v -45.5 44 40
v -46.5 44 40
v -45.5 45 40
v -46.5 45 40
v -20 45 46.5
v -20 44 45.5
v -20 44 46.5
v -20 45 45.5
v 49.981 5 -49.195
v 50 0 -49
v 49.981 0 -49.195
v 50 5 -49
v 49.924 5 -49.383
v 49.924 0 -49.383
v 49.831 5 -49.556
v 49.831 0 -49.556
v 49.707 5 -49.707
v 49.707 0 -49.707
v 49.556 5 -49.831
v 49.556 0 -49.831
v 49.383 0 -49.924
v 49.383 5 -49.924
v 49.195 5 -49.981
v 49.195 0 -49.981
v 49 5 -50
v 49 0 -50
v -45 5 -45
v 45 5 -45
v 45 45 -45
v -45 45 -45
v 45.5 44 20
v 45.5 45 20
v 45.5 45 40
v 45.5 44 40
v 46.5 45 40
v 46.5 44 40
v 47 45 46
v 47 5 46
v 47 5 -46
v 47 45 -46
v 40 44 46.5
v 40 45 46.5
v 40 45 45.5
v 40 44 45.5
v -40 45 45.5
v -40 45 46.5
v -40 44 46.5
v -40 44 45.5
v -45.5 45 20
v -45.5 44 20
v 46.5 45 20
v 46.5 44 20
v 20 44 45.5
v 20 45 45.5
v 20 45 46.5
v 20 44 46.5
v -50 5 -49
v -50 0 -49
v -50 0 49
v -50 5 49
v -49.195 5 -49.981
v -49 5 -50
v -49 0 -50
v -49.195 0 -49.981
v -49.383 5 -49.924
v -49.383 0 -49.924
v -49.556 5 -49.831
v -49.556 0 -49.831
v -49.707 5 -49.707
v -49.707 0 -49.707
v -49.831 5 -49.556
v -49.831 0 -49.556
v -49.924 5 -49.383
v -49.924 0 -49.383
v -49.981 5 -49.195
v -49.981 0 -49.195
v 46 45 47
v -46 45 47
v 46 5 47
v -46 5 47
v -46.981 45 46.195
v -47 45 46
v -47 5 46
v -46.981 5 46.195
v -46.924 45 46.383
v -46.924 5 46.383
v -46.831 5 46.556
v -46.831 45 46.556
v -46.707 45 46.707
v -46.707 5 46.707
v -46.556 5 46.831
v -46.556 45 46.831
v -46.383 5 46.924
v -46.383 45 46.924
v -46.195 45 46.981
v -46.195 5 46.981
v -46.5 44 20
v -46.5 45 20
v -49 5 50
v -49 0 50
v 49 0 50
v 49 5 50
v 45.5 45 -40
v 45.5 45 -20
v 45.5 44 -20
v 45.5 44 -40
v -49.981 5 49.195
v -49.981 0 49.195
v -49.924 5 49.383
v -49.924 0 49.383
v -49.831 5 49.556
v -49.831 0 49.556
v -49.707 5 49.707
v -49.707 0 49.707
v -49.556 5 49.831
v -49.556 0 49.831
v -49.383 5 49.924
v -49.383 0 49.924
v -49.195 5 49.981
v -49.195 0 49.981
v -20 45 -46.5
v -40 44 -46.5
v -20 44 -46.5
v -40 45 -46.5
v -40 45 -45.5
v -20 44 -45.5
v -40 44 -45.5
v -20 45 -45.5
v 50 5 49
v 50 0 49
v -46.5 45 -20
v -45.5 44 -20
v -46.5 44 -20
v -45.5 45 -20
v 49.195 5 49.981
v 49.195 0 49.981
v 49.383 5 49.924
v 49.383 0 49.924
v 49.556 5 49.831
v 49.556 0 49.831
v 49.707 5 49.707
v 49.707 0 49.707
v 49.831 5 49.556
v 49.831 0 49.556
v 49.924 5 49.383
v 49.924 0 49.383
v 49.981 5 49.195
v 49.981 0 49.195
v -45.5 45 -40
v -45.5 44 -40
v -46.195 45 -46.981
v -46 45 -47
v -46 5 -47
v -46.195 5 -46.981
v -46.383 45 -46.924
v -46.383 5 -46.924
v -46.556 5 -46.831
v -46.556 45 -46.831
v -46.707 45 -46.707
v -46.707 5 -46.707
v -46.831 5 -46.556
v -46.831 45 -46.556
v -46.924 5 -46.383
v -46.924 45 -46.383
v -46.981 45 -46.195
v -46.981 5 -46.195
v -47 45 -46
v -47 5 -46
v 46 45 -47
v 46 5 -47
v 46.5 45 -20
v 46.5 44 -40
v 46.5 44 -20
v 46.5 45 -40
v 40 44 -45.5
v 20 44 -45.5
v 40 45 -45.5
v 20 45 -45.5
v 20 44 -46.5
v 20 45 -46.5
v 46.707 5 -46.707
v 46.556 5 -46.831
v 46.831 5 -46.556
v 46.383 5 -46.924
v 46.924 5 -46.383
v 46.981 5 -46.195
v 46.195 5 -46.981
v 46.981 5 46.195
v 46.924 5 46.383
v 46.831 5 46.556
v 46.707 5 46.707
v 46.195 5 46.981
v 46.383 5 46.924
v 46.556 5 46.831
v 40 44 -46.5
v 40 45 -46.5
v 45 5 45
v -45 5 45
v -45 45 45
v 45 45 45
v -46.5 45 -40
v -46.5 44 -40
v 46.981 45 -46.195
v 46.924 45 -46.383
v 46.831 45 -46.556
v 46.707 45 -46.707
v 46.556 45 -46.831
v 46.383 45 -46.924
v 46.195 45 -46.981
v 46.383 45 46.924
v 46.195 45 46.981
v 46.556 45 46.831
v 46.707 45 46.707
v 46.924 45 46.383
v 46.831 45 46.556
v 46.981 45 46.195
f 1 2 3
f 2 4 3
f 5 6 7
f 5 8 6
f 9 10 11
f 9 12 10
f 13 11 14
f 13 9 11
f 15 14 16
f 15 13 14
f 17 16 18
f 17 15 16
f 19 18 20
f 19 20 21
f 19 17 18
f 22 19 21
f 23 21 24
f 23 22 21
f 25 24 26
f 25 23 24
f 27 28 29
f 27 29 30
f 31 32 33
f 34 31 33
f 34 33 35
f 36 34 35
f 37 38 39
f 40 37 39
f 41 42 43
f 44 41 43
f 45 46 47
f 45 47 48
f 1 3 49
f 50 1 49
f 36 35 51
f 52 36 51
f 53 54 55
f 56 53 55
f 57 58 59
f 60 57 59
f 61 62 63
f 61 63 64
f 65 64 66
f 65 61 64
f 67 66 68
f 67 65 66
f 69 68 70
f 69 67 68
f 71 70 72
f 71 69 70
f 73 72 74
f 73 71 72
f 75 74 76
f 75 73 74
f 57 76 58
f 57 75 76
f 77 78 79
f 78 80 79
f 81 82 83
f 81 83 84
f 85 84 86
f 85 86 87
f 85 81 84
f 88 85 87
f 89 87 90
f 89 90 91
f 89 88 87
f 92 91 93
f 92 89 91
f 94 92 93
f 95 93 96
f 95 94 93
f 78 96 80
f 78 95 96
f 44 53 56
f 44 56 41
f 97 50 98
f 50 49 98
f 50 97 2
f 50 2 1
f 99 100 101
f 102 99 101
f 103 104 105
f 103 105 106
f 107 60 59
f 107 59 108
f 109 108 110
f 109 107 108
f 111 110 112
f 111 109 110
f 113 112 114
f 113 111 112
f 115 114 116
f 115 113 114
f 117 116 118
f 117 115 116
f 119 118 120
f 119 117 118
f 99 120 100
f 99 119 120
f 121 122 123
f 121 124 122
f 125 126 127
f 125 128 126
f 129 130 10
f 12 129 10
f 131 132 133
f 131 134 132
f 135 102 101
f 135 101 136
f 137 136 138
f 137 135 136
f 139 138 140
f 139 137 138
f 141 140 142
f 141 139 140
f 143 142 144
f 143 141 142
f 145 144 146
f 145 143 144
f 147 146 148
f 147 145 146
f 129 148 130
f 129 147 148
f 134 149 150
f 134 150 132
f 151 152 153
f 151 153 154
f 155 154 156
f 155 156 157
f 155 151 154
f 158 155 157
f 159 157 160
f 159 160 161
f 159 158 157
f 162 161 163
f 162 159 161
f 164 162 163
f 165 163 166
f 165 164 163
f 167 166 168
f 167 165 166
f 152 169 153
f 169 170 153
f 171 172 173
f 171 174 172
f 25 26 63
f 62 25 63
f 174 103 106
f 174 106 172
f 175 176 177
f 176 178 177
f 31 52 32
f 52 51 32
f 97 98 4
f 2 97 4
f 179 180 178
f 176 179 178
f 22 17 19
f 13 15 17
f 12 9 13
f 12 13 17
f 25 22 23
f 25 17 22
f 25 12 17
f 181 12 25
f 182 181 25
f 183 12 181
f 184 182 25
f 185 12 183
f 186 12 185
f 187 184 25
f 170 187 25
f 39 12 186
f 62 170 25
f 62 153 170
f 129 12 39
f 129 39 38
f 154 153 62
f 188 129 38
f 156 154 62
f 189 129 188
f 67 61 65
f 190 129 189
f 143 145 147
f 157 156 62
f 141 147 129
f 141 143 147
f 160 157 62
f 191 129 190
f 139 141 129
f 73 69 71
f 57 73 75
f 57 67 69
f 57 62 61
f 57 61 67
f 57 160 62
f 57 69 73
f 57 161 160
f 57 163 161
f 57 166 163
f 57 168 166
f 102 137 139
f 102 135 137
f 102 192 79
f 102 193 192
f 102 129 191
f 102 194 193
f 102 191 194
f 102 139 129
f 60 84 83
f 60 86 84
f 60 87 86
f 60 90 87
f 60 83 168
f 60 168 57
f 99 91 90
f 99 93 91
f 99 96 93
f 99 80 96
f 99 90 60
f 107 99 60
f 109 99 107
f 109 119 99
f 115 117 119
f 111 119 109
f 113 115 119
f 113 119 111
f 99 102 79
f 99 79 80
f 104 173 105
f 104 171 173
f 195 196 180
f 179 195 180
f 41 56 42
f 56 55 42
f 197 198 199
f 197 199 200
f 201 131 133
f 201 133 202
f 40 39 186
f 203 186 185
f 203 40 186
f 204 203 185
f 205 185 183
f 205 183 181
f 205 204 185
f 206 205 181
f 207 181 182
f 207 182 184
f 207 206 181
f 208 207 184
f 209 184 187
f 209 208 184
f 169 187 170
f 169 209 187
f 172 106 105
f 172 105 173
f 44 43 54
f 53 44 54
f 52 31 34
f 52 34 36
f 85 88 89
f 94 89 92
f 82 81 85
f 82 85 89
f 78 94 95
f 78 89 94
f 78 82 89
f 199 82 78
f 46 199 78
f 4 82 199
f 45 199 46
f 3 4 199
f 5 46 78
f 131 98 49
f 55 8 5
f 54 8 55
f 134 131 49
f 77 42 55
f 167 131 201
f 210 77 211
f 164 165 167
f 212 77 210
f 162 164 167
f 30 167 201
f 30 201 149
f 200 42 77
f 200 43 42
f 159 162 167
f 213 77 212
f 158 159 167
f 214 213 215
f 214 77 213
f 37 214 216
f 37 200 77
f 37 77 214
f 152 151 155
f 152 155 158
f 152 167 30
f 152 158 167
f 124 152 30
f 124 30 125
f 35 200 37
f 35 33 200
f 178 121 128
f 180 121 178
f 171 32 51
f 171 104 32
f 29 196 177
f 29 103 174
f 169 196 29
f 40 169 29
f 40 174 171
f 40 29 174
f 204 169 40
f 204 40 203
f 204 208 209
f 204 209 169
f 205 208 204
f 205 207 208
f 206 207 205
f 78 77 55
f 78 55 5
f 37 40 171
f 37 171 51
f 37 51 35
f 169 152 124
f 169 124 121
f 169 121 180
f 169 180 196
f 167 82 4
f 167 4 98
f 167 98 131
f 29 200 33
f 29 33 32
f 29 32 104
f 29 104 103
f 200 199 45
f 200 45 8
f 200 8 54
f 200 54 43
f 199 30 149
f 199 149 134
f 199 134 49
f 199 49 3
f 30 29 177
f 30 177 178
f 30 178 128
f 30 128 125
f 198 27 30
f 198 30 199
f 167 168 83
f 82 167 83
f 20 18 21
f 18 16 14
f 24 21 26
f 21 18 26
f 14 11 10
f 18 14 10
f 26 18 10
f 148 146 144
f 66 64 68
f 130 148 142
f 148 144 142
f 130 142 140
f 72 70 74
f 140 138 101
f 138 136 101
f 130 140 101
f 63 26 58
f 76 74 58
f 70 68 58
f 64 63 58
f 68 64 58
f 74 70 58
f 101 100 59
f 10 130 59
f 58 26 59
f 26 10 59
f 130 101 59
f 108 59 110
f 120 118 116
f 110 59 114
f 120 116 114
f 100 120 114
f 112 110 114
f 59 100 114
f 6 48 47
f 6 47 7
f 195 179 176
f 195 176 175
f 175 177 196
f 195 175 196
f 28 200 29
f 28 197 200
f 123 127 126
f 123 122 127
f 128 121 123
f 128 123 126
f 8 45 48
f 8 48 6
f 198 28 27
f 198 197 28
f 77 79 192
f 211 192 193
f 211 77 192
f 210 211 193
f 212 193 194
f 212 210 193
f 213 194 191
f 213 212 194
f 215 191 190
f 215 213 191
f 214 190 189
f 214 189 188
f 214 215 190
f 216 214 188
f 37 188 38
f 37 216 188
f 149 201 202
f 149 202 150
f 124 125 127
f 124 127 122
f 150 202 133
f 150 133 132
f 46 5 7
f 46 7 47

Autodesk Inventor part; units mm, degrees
ref_plane "YZ Plane" through (0, 0, 0) normal (1, 0, 0) x (0, 1, 0)
ref_plane "XZ Plane" through (0, 0, 0) normal (0, 1, 0) x (-1, 0, 0)
ref_plane "XY Plane" through (0, 0, 0) normal (0, 0, 1) x (1, 0, 0)
sketch "Sketch1" plane through (0, 0, 0) normal (0, 1, 0) x (-1, 0, 0)
  line L0 (-50, -50) -> (50, -50)
  line L1 (50, -50) -> (50, 50)
  line L2 (50, 50) -> (-50, 50)
  line L3 (-50, 50) -> (-50, -50)
  line L4 (-50, -50) -> (50, 50) construction
  line L5 (50, -50) -> (-50, 50) construction
  point P0 (0, 0)
  dimension "d2" = 100
  dimension "d3" = 100
extrude "Extrusion1" add sketch "Sketch1" along normal blind 5
sketch "Sketch2" plane through (0, 5, 0) normal (0, 1, 0) x (1, 0, 0)
  line L0 (-50, 50) -> (-50, -50) projected
  line L1 (-50, -50) -> (50, -50) projected
  line L2 (50, -50) -> (50, 50) projected
  line L3 (50, 50) -> (-50, 50) projected
  line L4 (47, 47) -> (-47, 47)
  line L5 (-47, 47) -> (-47, -47)
  line L6 (-47, -47) -> (47, -47)
  line L7 (47, -47) -> (47, 47)
  line L8 (47, 47) -> (-47, -47) construction
  line L9 (-47, 47) -> (47, -47) construction
  line L10 (45, 45) -> (-45, 45)
  line L11 (-45, 45) -> (-45, -45)
  line L12 (-45, -45) -> (45, -45)
  line L13 (45, -45) -> (45, 45)
  line L14 (45, 45) -> (-45, -45) construction
  line L15 (-45, 45) -> (45, -45) construction
  point P0 (0, 0)
  dimension "d6" = 3
  dimension "d7" = 2
extrude "Extrusion2" add sketch "Sketch2" along normal blind 40 contours L7 L6 L5 L4
fillet "Fillet1" radius 1 1 edges at (50, 2.5, 50)
fillet "Fillet2" radius 1 1 edges at (50, 2.5, -50)
fillet "Fillet3" radius 1 1 edges at (-50, 2.5, 50)
fillet "Fillet4" radius 1 1 edges at (-50, 2.5, -50)
fillet "Fillet5" radius 1 1 edges at (-47, 25, 47)
fillet "Fillet6" radius 1 1 edges at (47, 25, 47)
fillet "Fillet7" radius 1 1 edges at (47, 25, -47)
fillet "Fillet8" radius 1 1 edges at (-47, 25, -47)
sketch "Sketch3" plane through (0, 45, 0) normal (0, 1, 0) x (1, 0, 0)
  arc A0 (-46, 47) -> (-47, 46) centre (-46, 46) ccw projected
  line L0 (-47, 46) -> (-47, -46) projected
  arc A1 (-47, -46) -> (-46, -47) centre (-46, -46) ccw projected
  line L1 (-46, -47) -> (46, -47) projected
  arc A2 (46, -47) -> (47, -46) centre (46, -46) ccw projected
  line L2 (47, -46) -> (47, 46) projected
  arc A3 (47, 46) -> (46, 47) centre (46, 46) ccw projected
  line L3 (46, 47) -> (-46, 47) projected
  line L4 (45, 45) -> (45, -45) projected
  line L5 (45, -45) -> (-45, -45) projected
  line L6 (-45, -45) -> (-45, 45) projected
  line L7 (-45, 45) -> (45, 45) projected
  line L8 (-46.5, -40) -> (-45.5, -40)
  line L9 (-45.5, -40) -> (-45.5, -20)
  line L10 (-45.5, -20) -> (-46.5, -20)
  line L11 (-46.5, -20) -> (-46.5, -40)
  line L12 (-46.5, 40) -> (-45.5, 40)
  line L13 (-45.5, 40) -> (-45.5, 20)
  line L14 (-45.5, 20) -> (-46.5, 20)
  line L15 (-46.5, 20) -> (-46.5, 40)
  line L16 (-40, 46.5) -> (-20, 46.5)
  line L17 (-20, 46.5) -> (-20, 45.5)
  line L18 (-20, 45.5) -> (-40, 45.5)
  line L19 (-40, 45.5) -> (-40, 46.5)
  line L20 (40, 46.5) -> (20, 46.5)
  line L21 (20, 46.5) -> (20, 45.5)
  line L22 (20, 45.5) -> (40, 45.5)
  line L23 (40, 45.5) -> (40, 46.5)
  line L24 (45.5, 40) -> (46.5, 40)
  line L25 (46.5, 40) -> (46.5, 20)
  line L26 (46.5, 20) -> (45.5, 20)
  line L27 (45.5, 20) -> (45.5, 40)
  line L28 (45.5, -40) -> (46.5, -40)
  line L29 (46.5, -40) -> (46.5, -20)
  line L30 (46.5, -20) -> (45.5, -20)
  line L31 (45.5, -20) -> (45.5, -40)
  line L32 (40, -45.5) -> (20, -45.5)
  line L33 (20, -45.5) -> (20, -46.5)
  line L34 (20, -46.5) -> (40, -46.5)
  line L35 (40, -46.5) -> (40, -45.5)
  line L36 (-40, -45.5) -> (-20, -45.5)
  line L37 (-20, -45.5) -> (-20, -46.5)
  line L38 (-20, -46.5) -> (-40, -46.5)
  line L39 (-40, -46.5) -> (-40, -45.5)
  point P0 (0, 0)
  point P1 (-46, 40)
  point P2 (-46, 20)
  point P3 (46, 40)
  dimension "d18" = 1
  dimension "d19" = 20
  dimension "d20" = 0.5
  dimension "d21" = 7
  dimension "d22" = 7
  dimension "d23" = 0.5
  dimension "d24" = 1
  dimension "d25" = 20
  dimension "d26" = 20
  dimension "d27" = 1
  dimension "d28" = 0.5
  dimension "d29" = 7
  dimension "d30" = 20
  dimension "d31" = 1
  dimension "d32" = 0.5
  dimension "d33" = 7
  dimension "d34" = 1
  dimension "d35" = 20
  dimension "d36" = 0.5
  dimension "d37" = 7
  dimension "d38" = 1
  dimension "d39" = 20
  dimension "d40" = 7
  dimension "d41" = 0.5
  dimension "d42" = 20
  dimension "d43" = 1
  dimension "d44" = 0.5
  dimension "d45" = 7
  dimension "d46" = 20
  dimension "d47" = 1
  dimension "d48" = 0.5
  dimension "d49" = 7
extrude "Extrusion3" cut sketch "Sketch3" against normal blind 1 contours L11 L10 L9 L8 | L12 L13 L14 L15 | L16 L17 L18 L19 | L23 L22 L21 L20 | L24 L25 L26 L27 | L31 L30 L29 L28 | L35 L34 L33 L32 | L36 L37 L38 L39
properties part number "block_main" material "PC/ABS Plastic"
